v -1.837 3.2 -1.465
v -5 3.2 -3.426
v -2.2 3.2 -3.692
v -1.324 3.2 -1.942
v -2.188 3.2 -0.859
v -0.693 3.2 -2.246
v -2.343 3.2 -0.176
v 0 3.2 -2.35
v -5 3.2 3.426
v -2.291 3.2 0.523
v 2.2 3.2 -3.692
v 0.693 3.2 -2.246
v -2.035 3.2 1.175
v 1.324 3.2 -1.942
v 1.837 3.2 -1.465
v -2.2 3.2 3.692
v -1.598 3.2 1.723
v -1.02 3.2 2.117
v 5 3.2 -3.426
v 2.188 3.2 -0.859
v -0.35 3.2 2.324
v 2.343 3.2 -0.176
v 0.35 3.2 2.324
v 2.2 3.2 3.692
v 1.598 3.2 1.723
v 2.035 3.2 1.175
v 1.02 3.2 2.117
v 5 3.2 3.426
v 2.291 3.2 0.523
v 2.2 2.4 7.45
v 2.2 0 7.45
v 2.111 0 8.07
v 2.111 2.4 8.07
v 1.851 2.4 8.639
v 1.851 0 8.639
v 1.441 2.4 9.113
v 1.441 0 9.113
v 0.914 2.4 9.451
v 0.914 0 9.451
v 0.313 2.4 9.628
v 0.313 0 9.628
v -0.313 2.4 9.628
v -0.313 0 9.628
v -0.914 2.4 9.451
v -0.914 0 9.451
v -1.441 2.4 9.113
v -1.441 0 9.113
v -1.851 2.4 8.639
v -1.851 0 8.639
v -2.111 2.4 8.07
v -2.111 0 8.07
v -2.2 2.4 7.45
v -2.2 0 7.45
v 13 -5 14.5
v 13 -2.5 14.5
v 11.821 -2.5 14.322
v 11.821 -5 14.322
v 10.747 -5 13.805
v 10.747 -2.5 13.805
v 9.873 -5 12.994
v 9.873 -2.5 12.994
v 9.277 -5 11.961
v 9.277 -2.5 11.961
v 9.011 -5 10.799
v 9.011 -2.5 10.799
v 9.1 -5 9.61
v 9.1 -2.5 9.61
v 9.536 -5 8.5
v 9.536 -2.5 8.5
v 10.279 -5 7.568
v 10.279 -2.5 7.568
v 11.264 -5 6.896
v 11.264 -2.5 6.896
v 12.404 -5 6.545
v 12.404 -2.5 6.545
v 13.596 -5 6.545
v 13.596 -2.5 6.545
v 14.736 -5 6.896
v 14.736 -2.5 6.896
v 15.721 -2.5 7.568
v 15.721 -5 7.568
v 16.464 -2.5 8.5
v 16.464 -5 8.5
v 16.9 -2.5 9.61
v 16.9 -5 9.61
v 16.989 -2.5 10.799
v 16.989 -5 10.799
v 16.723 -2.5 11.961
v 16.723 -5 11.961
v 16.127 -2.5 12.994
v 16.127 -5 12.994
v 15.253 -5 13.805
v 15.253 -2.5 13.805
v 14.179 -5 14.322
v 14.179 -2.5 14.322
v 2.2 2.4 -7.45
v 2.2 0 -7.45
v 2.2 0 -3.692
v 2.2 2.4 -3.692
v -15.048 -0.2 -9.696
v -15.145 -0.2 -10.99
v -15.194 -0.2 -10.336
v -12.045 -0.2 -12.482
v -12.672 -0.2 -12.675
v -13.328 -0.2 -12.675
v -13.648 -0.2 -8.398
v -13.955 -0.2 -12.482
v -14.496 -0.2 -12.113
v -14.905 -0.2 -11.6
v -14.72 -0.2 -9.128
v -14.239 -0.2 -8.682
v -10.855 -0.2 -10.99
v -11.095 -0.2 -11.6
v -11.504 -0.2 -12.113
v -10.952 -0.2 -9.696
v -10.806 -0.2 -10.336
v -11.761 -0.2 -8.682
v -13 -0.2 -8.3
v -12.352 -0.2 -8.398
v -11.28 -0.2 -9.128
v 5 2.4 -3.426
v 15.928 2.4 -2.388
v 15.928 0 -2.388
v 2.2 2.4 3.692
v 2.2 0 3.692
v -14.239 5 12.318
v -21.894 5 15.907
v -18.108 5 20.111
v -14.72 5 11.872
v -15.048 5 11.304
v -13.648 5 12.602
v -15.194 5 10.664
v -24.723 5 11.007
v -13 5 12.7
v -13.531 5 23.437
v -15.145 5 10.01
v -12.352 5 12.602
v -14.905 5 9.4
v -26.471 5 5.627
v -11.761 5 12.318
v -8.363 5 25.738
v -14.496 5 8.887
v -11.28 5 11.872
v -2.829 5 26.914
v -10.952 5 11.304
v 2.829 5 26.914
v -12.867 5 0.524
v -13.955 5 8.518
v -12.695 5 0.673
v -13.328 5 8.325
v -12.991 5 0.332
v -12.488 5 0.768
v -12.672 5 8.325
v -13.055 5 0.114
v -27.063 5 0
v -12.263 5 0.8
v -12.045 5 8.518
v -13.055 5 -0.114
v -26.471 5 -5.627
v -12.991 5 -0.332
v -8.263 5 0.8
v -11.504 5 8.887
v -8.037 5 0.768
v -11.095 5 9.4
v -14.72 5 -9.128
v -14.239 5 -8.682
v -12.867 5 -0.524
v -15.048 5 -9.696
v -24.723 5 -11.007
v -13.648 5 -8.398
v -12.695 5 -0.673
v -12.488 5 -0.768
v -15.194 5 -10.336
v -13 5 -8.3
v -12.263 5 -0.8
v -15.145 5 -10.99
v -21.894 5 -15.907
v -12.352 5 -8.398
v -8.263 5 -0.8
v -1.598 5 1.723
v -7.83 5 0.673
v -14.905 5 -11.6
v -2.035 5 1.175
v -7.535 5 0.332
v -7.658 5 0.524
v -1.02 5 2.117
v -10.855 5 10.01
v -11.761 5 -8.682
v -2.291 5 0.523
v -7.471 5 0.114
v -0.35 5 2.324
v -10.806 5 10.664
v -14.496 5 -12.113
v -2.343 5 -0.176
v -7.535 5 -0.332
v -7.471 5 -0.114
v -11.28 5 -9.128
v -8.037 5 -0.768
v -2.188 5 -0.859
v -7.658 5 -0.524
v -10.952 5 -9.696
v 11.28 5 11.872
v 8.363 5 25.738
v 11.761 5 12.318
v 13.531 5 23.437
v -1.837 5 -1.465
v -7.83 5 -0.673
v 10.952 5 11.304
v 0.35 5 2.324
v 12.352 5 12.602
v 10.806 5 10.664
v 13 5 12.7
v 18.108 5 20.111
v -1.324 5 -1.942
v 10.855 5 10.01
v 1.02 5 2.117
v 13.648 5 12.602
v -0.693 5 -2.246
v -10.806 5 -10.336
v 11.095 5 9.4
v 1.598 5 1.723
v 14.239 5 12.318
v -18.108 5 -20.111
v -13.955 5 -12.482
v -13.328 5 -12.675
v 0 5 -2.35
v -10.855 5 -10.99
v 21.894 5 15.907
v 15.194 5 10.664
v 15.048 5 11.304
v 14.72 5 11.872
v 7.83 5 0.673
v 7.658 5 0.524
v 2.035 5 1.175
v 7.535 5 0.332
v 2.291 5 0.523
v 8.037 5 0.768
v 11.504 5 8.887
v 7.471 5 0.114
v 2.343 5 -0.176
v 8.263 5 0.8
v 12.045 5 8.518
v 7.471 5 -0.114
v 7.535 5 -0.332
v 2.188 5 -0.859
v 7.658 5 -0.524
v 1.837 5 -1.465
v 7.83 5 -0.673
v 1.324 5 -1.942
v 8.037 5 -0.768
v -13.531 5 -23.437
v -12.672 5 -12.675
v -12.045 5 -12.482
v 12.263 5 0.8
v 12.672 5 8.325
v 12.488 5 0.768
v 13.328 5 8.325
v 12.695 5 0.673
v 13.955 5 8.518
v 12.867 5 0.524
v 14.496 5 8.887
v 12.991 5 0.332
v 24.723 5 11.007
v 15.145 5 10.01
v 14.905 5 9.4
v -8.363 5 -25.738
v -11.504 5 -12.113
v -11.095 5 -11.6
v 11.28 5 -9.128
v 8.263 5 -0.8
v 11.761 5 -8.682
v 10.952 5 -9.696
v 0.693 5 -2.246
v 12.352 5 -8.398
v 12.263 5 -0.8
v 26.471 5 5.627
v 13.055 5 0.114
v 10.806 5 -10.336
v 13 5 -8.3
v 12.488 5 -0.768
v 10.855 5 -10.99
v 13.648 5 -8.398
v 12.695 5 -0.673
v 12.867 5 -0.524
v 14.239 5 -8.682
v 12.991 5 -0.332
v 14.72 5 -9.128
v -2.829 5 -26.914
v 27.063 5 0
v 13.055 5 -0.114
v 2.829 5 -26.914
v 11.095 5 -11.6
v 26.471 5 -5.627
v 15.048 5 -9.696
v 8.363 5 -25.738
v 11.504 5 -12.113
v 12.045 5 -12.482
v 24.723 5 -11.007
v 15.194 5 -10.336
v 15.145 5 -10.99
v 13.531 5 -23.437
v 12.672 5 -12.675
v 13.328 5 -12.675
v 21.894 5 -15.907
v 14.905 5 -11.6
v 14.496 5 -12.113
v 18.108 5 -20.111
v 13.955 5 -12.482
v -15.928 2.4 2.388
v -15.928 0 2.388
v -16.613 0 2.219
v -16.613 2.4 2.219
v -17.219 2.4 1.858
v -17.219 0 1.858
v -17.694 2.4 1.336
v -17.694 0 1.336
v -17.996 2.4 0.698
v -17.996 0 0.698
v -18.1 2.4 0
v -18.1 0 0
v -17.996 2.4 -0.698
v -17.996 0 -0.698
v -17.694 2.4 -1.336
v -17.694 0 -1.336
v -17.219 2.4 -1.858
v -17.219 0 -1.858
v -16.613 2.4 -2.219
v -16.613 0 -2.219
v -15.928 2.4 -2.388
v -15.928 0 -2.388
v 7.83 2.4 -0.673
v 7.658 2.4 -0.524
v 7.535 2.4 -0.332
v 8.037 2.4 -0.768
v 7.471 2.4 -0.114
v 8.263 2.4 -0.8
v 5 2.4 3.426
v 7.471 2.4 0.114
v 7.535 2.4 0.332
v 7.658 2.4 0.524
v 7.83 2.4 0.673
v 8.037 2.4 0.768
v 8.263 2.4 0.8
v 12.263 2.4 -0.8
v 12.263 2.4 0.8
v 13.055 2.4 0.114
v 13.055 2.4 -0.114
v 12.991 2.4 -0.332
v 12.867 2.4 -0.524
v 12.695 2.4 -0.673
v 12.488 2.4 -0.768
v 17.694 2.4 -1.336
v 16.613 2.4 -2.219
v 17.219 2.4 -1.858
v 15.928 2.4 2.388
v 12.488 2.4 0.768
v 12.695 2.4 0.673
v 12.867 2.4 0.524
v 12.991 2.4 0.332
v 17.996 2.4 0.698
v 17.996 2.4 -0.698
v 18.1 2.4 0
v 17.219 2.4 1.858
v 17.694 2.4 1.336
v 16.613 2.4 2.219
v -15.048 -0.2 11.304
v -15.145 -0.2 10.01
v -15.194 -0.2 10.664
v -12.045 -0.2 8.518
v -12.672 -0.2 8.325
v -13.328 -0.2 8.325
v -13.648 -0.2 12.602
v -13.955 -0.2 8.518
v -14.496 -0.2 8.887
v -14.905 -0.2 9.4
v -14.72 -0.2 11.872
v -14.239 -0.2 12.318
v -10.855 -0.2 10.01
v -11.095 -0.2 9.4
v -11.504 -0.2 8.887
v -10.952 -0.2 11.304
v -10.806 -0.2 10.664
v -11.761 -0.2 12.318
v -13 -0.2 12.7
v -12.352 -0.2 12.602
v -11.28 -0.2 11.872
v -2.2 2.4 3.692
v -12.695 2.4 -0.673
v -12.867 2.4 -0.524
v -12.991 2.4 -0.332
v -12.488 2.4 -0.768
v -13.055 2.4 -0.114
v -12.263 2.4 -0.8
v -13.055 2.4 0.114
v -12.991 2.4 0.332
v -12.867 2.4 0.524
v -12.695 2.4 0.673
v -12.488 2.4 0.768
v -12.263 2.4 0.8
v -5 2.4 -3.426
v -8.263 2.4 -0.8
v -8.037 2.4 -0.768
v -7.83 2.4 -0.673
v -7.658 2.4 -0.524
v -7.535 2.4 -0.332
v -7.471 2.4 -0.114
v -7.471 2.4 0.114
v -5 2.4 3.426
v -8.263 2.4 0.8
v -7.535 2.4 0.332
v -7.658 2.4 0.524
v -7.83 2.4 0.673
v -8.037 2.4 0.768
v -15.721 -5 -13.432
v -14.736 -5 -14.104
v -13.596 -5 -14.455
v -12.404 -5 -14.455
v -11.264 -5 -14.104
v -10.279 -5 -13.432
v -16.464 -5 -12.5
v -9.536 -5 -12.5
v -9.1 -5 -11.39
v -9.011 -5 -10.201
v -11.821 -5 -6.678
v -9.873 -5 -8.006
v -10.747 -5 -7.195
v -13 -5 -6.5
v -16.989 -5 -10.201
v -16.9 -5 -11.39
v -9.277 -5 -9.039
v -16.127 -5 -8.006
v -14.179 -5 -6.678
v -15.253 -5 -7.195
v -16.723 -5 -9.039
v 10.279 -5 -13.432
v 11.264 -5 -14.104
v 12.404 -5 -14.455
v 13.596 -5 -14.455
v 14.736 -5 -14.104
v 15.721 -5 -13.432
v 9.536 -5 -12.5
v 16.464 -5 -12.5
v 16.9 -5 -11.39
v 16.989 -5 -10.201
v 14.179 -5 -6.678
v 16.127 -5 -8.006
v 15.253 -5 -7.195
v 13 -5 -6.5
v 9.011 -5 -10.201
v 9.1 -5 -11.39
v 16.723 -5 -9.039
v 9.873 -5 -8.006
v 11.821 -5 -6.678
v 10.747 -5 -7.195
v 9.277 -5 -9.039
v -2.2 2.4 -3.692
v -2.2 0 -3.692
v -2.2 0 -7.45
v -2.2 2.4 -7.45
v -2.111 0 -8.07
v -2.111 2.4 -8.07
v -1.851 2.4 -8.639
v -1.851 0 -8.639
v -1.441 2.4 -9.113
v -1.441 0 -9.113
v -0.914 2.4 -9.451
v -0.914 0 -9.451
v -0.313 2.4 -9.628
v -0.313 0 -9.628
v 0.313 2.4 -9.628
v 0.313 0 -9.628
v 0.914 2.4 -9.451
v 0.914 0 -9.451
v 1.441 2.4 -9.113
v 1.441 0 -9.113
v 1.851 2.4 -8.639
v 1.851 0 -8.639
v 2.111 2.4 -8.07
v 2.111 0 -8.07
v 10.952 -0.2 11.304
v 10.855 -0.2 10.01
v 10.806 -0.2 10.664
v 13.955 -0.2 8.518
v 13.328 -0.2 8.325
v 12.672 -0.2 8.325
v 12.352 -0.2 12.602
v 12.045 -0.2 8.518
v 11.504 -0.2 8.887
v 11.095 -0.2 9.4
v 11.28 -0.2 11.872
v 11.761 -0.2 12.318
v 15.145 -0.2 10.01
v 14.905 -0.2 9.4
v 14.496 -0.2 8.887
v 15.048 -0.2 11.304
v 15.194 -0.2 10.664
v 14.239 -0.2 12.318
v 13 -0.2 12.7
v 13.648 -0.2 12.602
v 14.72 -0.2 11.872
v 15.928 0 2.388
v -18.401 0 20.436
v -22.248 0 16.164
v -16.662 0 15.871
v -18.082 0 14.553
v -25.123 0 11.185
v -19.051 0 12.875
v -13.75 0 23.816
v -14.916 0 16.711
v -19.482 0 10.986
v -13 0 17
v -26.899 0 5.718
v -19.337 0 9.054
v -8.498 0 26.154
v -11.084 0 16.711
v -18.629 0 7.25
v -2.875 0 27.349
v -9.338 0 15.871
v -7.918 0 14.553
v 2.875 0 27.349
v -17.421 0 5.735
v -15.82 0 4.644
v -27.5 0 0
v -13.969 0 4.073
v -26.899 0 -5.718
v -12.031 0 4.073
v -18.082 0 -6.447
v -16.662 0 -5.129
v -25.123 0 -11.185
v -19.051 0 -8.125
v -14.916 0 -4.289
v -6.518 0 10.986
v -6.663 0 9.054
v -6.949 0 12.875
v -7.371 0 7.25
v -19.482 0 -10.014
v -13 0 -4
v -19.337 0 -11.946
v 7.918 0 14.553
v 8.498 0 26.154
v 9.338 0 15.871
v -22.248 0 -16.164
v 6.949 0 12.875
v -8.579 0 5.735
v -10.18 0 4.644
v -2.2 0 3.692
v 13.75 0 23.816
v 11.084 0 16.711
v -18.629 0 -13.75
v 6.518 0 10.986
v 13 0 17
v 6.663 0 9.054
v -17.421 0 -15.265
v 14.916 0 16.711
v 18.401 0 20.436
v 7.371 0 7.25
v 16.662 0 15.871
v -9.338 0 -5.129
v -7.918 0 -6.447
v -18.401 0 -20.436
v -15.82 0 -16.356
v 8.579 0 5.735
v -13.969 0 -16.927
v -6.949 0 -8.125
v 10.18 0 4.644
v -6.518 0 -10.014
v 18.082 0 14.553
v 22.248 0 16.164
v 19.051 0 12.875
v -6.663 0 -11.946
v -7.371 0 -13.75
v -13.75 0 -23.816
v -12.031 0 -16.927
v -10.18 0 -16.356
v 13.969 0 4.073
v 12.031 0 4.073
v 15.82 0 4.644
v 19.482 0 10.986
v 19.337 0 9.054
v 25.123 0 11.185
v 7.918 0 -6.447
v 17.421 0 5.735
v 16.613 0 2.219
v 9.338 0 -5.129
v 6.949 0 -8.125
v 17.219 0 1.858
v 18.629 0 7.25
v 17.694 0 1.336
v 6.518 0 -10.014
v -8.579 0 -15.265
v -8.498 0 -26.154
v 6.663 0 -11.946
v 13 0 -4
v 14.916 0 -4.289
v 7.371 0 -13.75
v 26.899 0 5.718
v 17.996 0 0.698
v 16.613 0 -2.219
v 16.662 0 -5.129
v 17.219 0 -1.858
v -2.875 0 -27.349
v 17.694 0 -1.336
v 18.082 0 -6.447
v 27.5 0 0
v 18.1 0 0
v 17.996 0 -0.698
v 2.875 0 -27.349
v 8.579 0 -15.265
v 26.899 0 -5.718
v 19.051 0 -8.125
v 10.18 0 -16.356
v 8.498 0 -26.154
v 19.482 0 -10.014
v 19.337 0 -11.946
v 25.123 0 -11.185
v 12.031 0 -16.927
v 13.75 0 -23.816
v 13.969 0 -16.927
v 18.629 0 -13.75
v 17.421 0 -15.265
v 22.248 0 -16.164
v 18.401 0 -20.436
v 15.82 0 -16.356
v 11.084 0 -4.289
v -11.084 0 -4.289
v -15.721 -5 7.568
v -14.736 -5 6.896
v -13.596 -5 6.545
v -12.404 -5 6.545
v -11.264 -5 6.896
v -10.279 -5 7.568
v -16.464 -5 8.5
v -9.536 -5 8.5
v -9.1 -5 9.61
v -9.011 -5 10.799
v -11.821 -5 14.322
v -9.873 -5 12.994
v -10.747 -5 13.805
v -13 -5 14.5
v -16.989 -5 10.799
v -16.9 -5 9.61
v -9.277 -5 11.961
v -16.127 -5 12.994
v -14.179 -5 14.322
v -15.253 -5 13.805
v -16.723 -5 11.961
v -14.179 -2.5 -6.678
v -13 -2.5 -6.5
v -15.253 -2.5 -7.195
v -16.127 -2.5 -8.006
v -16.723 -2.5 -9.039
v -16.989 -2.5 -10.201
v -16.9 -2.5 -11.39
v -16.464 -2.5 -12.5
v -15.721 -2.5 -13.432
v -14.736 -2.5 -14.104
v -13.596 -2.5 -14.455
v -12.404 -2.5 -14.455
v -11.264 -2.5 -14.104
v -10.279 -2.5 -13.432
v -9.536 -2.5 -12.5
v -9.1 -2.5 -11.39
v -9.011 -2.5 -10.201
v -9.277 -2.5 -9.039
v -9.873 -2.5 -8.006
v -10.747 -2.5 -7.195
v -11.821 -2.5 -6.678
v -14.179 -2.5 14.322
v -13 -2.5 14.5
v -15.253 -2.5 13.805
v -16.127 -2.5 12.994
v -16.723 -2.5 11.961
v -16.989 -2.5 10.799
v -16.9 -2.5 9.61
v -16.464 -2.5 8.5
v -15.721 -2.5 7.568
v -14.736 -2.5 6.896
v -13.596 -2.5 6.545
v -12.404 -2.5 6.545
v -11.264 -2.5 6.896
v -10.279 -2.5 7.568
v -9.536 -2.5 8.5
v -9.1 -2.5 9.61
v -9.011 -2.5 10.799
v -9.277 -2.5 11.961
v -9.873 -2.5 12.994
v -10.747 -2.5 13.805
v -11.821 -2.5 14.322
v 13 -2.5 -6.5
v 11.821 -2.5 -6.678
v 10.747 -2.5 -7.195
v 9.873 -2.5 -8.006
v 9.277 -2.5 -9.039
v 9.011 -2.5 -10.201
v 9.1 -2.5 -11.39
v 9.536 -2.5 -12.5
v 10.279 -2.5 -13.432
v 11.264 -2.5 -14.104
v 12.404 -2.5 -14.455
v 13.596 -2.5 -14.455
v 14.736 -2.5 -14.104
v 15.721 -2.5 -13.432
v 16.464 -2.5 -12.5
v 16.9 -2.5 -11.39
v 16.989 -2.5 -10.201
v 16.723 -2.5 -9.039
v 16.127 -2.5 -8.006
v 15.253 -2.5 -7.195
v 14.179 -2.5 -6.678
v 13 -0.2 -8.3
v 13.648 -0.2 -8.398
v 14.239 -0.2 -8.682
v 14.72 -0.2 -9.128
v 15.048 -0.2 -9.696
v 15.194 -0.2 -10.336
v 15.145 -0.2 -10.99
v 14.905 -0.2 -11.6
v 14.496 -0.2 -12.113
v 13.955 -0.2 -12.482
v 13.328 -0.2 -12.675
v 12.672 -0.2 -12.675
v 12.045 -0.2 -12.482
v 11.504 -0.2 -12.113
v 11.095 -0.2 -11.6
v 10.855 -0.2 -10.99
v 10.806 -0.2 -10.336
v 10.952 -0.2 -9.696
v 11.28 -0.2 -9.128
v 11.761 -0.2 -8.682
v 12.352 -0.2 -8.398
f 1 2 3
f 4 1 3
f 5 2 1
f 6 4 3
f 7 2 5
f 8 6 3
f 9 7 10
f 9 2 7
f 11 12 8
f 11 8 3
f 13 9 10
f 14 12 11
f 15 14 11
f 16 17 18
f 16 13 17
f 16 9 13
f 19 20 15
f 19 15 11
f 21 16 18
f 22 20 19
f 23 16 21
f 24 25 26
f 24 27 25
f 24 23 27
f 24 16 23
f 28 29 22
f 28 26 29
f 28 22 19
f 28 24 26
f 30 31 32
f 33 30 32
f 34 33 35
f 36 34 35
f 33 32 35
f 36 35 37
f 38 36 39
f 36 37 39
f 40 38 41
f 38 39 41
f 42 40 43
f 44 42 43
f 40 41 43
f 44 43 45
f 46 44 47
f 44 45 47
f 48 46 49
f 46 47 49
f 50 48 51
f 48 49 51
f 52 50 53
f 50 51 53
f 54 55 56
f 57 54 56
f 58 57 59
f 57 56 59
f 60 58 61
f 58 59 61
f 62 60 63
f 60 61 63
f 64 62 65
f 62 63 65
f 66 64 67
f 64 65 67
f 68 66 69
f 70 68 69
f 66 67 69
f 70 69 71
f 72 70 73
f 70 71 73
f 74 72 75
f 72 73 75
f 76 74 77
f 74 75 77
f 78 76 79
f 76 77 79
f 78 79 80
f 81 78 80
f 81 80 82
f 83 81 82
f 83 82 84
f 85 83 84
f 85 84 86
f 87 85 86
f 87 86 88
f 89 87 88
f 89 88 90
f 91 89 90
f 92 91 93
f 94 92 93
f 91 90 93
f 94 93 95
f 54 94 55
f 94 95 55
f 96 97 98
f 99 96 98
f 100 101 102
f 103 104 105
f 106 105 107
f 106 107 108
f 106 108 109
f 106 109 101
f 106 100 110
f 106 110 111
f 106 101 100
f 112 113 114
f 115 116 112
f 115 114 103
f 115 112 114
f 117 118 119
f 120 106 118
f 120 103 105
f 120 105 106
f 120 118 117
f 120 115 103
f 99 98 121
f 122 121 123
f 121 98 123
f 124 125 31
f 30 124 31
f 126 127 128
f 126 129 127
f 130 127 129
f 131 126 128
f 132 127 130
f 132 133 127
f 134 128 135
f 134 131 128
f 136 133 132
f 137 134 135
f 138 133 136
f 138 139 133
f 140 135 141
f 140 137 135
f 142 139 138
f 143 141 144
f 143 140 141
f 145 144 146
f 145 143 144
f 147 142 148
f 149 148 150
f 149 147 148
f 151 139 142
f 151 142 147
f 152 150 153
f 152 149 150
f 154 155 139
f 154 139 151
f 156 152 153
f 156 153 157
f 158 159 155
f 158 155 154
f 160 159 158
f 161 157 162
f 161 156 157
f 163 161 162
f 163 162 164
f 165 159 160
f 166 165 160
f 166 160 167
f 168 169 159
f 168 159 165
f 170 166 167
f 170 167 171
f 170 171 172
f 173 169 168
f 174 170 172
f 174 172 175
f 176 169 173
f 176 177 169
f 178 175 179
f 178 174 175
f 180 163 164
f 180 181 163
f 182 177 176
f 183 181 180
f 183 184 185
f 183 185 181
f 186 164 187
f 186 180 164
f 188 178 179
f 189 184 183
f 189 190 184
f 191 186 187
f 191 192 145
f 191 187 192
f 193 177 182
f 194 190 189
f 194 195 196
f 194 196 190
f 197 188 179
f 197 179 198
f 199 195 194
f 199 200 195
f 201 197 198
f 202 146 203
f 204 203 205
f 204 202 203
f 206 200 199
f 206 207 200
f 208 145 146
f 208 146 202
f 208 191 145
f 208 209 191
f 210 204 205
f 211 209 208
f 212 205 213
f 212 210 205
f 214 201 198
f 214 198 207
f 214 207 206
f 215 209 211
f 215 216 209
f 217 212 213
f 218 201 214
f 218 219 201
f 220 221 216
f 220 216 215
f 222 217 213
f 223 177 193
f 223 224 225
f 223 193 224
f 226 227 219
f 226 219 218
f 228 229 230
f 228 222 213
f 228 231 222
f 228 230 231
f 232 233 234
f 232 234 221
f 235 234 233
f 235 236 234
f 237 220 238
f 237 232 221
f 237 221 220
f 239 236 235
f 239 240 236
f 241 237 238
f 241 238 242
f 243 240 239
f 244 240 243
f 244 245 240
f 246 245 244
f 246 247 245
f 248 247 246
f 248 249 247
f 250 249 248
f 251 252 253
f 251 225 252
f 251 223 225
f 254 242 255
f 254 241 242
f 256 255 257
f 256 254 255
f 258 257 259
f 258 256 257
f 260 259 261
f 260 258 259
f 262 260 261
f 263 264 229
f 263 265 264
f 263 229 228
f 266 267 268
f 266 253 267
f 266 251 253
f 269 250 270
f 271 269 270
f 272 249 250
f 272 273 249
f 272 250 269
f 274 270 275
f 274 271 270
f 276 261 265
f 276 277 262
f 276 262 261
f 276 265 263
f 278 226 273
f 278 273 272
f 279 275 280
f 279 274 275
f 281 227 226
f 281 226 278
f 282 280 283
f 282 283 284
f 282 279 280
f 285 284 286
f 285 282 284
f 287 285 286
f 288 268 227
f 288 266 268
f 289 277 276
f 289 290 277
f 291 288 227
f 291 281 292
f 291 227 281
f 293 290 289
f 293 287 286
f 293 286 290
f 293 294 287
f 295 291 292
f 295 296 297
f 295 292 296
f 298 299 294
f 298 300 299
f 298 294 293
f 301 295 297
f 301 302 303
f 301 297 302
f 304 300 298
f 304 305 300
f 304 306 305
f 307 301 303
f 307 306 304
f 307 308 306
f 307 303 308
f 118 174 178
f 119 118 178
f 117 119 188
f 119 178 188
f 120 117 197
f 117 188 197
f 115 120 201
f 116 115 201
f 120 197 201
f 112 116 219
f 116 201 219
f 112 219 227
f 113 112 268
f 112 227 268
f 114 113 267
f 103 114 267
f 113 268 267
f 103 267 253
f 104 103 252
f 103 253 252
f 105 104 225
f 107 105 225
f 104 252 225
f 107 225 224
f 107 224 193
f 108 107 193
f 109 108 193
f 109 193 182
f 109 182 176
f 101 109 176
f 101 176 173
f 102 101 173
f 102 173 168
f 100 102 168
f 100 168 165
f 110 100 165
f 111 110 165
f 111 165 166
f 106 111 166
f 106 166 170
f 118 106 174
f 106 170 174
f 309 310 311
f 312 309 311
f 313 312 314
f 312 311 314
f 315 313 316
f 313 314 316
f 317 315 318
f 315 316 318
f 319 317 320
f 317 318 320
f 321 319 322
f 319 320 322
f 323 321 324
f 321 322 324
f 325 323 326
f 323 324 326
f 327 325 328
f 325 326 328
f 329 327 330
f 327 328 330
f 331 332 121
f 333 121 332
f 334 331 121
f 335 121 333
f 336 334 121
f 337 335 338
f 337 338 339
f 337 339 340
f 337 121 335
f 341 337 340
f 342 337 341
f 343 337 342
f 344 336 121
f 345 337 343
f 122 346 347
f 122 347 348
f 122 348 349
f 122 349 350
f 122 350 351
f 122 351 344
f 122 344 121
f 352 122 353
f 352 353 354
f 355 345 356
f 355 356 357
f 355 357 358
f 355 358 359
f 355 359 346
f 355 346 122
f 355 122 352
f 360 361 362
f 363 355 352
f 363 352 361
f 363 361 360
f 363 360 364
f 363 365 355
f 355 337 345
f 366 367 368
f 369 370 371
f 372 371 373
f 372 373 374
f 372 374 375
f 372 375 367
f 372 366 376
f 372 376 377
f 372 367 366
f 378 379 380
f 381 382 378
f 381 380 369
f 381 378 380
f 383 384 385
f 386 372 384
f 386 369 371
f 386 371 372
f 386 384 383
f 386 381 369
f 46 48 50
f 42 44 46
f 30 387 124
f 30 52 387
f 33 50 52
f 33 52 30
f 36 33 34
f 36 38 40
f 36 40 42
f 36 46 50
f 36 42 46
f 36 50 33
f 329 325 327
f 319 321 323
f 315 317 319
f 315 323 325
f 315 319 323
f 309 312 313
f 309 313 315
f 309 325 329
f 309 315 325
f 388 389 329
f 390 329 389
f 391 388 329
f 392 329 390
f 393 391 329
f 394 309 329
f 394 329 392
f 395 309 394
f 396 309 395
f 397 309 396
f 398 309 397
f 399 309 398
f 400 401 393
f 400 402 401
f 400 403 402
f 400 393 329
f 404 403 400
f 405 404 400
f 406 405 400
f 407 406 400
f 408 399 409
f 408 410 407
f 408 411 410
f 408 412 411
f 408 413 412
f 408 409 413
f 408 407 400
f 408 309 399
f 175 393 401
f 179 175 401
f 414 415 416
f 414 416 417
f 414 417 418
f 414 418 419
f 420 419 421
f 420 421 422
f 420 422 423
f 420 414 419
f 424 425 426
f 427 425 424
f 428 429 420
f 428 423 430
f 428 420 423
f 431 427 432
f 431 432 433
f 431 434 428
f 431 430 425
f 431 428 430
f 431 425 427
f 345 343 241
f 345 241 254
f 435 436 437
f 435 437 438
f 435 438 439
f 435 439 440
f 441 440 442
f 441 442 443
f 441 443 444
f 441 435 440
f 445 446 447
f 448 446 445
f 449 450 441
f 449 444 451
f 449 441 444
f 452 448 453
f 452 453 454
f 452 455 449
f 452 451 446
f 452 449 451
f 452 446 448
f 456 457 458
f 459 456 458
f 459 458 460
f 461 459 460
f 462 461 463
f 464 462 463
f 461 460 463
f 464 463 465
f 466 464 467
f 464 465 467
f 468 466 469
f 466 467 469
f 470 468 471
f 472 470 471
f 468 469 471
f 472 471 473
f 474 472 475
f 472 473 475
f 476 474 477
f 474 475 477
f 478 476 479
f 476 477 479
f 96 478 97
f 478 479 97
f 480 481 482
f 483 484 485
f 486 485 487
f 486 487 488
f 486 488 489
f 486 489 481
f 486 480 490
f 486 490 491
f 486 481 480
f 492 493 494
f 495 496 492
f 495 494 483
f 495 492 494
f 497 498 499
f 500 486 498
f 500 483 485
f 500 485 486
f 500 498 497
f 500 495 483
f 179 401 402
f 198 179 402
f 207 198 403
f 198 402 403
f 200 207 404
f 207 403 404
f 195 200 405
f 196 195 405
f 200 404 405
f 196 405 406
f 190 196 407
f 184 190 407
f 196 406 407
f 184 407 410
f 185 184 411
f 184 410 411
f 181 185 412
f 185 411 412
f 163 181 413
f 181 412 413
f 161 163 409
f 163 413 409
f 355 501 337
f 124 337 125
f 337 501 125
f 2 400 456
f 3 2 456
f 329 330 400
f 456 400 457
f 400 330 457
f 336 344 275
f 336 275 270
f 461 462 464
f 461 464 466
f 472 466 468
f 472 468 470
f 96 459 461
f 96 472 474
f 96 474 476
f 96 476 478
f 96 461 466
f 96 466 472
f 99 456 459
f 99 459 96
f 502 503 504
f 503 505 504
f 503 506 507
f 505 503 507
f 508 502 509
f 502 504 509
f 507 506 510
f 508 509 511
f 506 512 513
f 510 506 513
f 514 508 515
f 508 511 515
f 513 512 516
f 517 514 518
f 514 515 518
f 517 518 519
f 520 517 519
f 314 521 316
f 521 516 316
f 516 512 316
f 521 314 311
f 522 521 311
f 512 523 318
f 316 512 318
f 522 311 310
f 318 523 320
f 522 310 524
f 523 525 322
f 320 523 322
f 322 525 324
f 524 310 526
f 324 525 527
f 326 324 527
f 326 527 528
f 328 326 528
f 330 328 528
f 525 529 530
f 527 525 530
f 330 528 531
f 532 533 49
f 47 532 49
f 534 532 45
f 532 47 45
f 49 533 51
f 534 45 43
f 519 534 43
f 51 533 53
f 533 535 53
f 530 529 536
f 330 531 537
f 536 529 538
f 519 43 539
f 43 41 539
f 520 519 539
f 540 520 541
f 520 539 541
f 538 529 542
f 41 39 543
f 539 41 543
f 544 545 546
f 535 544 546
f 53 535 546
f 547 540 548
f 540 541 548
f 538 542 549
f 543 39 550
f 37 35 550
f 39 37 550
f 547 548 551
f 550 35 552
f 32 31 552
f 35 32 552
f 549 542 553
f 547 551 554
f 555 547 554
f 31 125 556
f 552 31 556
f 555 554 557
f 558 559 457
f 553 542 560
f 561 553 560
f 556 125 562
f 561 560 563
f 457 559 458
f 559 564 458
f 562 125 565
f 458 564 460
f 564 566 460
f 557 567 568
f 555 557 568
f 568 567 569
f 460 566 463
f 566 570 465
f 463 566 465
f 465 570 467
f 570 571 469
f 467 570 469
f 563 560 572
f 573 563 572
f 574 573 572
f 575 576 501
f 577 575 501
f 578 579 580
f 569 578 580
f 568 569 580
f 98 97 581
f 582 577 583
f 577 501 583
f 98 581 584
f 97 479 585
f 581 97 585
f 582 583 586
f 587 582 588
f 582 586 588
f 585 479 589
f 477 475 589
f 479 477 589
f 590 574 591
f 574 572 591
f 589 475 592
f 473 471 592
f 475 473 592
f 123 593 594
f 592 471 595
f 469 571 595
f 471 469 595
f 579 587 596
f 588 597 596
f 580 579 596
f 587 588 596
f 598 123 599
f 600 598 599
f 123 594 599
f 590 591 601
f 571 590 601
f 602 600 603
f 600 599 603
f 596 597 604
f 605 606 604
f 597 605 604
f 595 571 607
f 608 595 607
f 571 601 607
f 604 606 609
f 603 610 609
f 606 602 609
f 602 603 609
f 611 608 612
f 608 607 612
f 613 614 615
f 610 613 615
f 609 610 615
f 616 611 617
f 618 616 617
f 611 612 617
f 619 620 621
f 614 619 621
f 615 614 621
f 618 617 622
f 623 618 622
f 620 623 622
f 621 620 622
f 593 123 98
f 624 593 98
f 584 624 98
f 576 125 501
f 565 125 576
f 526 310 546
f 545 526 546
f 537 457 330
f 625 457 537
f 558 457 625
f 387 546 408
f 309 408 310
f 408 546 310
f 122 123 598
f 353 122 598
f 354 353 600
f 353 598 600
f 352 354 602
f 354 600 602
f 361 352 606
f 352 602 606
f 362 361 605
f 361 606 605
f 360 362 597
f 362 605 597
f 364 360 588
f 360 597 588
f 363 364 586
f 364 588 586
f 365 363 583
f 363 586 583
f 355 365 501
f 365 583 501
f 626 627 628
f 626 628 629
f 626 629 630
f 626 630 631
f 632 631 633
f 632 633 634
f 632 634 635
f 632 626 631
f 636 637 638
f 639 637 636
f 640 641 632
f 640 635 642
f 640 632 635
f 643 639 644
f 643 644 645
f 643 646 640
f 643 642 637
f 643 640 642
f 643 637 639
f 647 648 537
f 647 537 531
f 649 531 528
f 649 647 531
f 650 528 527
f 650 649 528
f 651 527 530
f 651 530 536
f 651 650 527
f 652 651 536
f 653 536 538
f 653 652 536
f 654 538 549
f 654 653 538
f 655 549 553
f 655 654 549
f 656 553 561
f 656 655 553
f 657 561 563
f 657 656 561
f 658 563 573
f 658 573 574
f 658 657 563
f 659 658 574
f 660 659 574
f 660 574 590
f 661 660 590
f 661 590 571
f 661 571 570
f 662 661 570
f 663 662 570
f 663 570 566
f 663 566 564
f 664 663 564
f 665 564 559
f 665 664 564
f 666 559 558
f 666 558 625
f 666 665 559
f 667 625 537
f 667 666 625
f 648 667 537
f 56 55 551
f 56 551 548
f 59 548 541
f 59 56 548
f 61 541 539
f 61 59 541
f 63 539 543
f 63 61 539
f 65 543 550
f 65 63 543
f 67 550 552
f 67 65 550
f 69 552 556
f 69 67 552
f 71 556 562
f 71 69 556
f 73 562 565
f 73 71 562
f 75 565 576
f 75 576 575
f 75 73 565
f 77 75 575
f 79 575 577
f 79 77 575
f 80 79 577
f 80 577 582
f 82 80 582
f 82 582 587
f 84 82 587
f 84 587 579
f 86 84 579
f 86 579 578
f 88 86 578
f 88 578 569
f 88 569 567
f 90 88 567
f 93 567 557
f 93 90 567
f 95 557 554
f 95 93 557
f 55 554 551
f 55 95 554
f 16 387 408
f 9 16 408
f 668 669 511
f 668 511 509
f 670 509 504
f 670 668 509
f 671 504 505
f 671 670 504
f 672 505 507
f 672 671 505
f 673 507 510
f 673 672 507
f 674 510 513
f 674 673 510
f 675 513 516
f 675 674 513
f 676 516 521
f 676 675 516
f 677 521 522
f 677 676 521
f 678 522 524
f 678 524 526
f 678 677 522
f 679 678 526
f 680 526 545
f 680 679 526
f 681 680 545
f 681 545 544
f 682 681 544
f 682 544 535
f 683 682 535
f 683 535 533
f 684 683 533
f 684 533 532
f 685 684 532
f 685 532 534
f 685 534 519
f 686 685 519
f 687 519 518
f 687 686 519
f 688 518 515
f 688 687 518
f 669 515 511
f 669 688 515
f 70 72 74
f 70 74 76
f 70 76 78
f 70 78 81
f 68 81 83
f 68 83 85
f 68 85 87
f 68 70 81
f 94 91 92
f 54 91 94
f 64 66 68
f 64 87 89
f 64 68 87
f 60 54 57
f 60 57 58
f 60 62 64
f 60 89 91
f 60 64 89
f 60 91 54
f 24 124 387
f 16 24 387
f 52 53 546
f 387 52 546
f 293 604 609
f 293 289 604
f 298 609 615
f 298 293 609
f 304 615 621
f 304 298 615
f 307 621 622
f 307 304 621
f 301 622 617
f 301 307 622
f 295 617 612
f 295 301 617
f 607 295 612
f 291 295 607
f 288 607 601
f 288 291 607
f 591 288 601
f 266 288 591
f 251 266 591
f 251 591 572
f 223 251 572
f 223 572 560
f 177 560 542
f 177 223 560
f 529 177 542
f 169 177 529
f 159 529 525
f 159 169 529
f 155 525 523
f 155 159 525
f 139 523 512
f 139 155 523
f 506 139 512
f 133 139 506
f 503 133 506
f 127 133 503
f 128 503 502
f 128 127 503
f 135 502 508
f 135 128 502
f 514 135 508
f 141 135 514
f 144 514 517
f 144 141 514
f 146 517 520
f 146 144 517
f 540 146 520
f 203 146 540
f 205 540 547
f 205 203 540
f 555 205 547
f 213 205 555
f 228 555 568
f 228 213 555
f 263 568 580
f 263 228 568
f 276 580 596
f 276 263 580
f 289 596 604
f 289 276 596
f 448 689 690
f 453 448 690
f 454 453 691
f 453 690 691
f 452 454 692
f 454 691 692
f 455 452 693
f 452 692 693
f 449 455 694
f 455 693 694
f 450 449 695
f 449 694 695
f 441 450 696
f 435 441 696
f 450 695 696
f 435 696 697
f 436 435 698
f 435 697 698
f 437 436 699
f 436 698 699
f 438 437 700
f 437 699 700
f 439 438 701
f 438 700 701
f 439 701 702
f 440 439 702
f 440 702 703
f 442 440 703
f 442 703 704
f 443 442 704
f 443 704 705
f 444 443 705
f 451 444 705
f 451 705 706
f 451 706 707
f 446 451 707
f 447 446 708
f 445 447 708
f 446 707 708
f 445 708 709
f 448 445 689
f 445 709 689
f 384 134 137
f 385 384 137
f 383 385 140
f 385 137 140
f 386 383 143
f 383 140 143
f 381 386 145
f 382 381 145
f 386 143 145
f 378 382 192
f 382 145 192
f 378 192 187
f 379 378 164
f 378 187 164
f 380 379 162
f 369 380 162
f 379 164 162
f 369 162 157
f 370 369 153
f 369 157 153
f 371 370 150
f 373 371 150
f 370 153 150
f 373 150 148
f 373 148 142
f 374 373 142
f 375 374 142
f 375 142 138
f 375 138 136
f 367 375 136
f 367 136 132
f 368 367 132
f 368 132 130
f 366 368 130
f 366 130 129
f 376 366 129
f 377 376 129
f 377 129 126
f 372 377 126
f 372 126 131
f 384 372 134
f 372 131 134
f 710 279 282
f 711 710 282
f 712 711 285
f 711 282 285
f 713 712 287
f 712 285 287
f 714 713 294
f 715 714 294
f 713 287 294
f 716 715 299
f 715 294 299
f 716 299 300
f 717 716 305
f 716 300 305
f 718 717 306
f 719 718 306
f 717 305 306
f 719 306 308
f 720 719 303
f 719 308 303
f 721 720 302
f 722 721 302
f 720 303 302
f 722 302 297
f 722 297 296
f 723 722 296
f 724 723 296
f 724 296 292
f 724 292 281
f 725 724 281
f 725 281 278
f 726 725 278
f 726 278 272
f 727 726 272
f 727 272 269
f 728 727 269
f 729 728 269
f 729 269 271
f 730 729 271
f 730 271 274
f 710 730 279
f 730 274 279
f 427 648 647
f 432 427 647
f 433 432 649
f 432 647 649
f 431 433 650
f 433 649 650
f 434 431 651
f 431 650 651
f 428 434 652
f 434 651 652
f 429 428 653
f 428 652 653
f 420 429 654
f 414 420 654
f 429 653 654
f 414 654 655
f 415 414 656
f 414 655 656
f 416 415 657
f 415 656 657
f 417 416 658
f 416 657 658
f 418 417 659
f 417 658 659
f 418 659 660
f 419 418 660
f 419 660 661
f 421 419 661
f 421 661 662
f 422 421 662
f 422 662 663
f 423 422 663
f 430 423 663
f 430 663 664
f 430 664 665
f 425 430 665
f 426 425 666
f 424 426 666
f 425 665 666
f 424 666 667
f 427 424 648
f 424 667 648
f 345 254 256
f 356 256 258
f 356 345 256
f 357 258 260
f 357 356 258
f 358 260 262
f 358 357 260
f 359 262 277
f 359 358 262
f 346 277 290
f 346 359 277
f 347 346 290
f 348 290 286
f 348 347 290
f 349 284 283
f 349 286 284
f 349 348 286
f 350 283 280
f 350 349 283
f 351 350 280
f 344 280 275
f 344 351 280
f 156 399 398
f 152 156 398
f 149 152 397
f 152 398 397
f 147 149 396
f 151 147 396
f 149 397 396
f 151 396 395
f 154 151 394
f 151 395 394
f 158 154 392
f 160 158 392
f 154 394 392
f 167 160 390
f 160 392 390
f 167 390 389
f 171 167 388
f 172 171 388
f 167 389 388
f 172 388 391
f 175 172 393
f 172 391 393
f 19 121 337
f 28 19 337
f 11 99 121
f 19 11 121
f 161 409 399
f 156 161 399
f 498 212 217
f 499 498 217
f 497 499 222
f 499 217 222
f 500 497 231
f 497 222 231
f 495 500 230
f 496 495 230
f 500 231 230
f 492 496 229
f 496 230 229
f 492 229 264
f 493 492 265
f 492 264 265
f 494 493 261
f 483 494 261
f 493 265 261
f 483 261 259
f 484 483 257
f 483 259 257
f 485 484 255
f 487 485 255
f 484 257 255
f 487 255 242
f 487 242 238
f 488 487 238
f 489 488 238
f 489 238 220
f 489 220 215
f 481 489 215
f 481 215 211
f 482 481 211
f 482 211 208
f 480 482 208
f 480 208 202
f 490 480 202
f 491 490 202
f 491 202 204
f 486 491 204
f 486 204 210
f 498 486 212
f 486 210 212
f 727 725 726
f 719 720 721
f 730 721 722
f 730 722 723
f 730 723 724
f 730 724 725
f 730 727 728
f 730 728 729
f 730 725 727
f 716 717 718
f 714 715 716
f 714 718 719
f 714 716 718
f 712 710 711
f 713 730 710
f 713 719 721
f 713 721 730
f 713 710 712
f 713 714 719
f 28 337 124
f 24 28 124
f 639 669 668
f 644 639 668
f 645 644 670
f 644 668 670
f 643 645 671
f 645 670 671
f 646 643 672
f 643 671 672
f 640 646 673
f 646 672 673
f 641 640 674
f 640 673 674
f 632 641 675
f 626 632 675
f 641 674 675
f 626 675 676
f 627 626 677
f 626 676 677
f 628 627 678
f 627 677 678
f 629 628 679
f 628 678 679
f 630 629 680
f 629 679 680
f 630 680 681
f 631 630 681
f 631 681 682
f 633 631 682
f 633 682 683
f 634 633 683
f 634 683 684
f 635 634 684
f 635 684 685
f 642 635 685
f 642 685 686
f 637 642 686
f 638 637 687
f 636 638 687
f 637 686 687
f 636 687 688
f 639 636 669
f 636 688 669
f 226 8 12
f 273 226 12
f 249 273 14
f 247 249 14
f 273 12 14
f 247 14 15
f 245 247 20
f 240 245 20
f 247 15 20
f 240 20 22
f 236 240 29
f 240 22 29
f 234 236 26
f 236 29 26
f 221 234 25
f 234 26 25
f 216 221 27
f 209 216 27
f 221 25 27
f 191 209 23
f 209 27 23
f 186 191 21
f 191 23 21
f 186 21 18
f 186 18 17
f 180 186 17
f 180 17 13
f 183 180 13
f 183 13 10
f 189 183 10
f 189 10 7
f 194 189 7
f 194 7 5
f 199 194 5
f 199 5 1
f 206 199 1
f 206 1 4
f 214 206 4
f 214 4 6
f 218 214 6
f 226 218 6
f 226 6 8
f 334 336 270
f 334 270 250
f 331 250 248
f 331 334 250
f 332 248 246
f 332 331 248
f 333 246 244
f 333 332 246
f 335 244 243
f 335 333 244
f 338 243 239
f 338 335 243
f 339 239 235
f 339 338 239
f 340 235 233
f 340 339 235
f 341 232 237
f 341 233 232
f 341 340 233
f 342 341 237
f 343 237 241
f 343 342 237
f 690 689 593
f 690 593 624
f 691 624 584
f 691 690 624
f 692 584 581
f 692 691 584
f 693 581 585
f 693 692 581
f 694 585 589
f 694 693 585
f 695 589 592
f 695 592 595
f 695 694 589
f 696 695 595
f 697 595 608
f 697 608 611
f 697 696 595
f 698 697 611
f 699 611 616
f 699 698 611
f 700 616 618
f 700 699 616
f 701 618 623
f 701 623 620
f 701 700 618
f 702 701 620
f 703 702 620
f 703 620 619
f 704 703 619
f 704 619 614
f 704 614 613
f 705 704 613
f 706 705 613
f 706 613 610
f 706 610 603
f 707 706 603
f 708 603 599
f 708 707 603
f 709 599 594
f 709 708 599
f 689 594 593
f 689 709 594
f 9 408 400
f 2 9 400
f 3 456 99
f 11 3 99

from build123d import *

# Parameters (mm, degrees)
IZIM2_R                     = 27.5
Y_KSEKLIK_EKSTR_ZYON1_DEPTH = 5
Y_KSEKLIK_EKSTR_ZYON1_TAPER = 5
IZIM4_R                     = 3.625
KES_EKSTR_ZYON1_DEPTH       = 2.4
IZIM4_3_R                   = 2.35
KES_EKSTR_ZYON2_DEPTH       = 14
KES_EKSTR_ZYON3_DEPTH       = 3.2
KES_EKSTR_ZYON4_DEPTH       = 3.5
SKETCH1_R                   = 4
BOSS_EXTRUDE1_DEPTH         = 5
SKETCH3_R                   = 2.2
CUT_EXTRUDE1_DEPTH          = 5.2
CHAMFER1_SIZE               = 2.5


with BuildPart() as part:
    # Çizim2 → Yükseklik-Ekstrüzyon1 (new body)
    with BuildSketch(Plane(origin=(0, 0, 0), x_dir=(1, 0, 0), z_dir=(0, 1, 0))):
        Circle(IZIM2_R)
    extrude(amount=Y_KSEKLIK_EKSTR_ZYON1_DEPTH, taper=Y_KSEKLIK_EKSTR_ZYON1_TAPER)

    # Çizim4 → Kes-Ekstrüzyon1 (cut)
    with BuildSketch(Plane.XZ):
        with BuildLine():
            ThreePointArc((15.927868459, -2.388197354), (18.1, 0), (15.927868459, 2.388197354))
            Line((15.927868459, 2.388197354), (2.2, 3.691961397))
            Line((2.2, 3.691961397), (2.2, 7.45))
            ThreePointArc((2.2, 7.45), (0, 9.65), (-2.2, 7.45))
            Line((-2.2, 7.45), (-2.2, 3.691961397))
            Line((-2.2, 3.691961397), (-15.927868459, 2.388197354))
            ThreePointArc((-15.927868459, 2.388197354), (-18.1, 0), (-15.927868459, -2.388197354))
            Line((-15.927868459, -2.388197354), (-2.2, -3.691961397))
            Line((-2.2, -3.691961397), (-2.2, -7.45))
            ThreePointArc((-2.2, -7.45), (0, -9.65), (2.2, -7.45))
            Line((2.2, -7.45), (2.2, -3.691961397))
            Line((2.2, -3.691961397), (15.927868459, -2.388197354))
        make_face()
        Circle(IZIM4_R, mode=Mode.SUBTRACT)
    extrude(amount=-KES_EKSTR_ZYON1_DEPTH, mode=Mode.SUBTRACT)

    # Çizim4<3> → Kes-Ekstrüzyon2 (cut)
    with BuildSketch(Plane.XZ):
        Circle(IZIM4_3_R)
    extrude(amount=-KES_EKSTR_ZYON2_DEPTH, mode=Mode.SUBTRACT)

    # Çizim8 → Kes-Ekstrüzyon3 (cut)
    with BuildSketch(Plane.XZ):
        Polygon((-5, 3.426039609), (-5, -3.426039609), (-2.2, -3.691961397), (2.2, -3.691961397), (5, -3.426039609), (5, 3.426039609), (2.2, 3.691961397), (-2.2, 3.691961397), align=None)
    extrude(amount=-KES_EKSTR_ZYON3_DEPTH, mode=Mode.SUBTRACT)

    # Çizim9 → Kes-Ekstrüzyon4 (cut)
    with BuildSketch(Plane.XZ.offset(-2.4)):
        with BuildLine():
            Line((12.262809511, -0.8), (8.262809511, -0.8))
            ThreePointArc((8.262809511, -0.8), (7.462809511, 0), (8.262809511, 0.8))
            Line((8.262809511, 0.8), (12.262809511, 0.8))
            ThreePointArc((12.262809511, 0.8), (13.062809511, 0), (12.262809511, -0.8))
        make_face()
        with BuildLine():
            Line((-12.262809511, -0.8), (-8.262809511, -0.8))
            ThreePointArc((-8.262809511, -0.8), (-7.462809511, 0), (-8.262809511, 0.8))
            Line((-8.262809511, 0.8), (-12.262809511, 0.8))
            ThreePointArc((-12.262809511, 0.8), (-13.062809511, 0), (-12.262809511, -0.8))
        make_face()
    extrude(amount=-KES_EKSTR_ZYON4_DEPTH, mode=Mode.SUBTRACT)

    # Sketch1 → Boss-Extrude1 (add)
    with BuildSketch(Plane.XZ):
        with Locations((-13, 10.5)):
            Circle(SKETCH1_R)
        with Locations((13, 10.5)):
            Circle(SKETCH1_R)
        with Locations((13, -10.5)):
            Circle(SKETCH1_R)
        with Locations((-13, -10.5)):
            Circle(SKETCH1_R)
    extrude(amount=BOSS_EXTRUDE1_DEPTH)

    # Sketch3 → Cut-Extrude1 (cut)
    with BuildSketch(Plane(origin=(0, 5, 0), x_dir=(1, 0, 0), z_dir=(0, 1, 0))):
        with Locations((13, 10.5)):
            Circle(SKETCH3_R)
        with Locations((-13, 10.5)):
            Circle(SKETCH3_R)
        with Locations((-13, -10.5)):
            Circle(SKETCH3_R)
        with Locations((13, -10.5)):
            Circle(SKETCH3_R)
    extrude(amount=-CUT_EXTRUDE1_DEPTH, mode=Mode.SUBTRACT)

    # Chamfer1
    chamfer1_edges = [part.edges().sort_by_distance(p)[0] for p in [
        (-17, 0, -10.5),
        (9, 0, -10.5),
        (9, 0, 10.5),
        (-17, 0, 10.5),
    ]]
    chamfer(chamfer1_edges, length=CHAMFER1_SIZE)


solid = part.part
